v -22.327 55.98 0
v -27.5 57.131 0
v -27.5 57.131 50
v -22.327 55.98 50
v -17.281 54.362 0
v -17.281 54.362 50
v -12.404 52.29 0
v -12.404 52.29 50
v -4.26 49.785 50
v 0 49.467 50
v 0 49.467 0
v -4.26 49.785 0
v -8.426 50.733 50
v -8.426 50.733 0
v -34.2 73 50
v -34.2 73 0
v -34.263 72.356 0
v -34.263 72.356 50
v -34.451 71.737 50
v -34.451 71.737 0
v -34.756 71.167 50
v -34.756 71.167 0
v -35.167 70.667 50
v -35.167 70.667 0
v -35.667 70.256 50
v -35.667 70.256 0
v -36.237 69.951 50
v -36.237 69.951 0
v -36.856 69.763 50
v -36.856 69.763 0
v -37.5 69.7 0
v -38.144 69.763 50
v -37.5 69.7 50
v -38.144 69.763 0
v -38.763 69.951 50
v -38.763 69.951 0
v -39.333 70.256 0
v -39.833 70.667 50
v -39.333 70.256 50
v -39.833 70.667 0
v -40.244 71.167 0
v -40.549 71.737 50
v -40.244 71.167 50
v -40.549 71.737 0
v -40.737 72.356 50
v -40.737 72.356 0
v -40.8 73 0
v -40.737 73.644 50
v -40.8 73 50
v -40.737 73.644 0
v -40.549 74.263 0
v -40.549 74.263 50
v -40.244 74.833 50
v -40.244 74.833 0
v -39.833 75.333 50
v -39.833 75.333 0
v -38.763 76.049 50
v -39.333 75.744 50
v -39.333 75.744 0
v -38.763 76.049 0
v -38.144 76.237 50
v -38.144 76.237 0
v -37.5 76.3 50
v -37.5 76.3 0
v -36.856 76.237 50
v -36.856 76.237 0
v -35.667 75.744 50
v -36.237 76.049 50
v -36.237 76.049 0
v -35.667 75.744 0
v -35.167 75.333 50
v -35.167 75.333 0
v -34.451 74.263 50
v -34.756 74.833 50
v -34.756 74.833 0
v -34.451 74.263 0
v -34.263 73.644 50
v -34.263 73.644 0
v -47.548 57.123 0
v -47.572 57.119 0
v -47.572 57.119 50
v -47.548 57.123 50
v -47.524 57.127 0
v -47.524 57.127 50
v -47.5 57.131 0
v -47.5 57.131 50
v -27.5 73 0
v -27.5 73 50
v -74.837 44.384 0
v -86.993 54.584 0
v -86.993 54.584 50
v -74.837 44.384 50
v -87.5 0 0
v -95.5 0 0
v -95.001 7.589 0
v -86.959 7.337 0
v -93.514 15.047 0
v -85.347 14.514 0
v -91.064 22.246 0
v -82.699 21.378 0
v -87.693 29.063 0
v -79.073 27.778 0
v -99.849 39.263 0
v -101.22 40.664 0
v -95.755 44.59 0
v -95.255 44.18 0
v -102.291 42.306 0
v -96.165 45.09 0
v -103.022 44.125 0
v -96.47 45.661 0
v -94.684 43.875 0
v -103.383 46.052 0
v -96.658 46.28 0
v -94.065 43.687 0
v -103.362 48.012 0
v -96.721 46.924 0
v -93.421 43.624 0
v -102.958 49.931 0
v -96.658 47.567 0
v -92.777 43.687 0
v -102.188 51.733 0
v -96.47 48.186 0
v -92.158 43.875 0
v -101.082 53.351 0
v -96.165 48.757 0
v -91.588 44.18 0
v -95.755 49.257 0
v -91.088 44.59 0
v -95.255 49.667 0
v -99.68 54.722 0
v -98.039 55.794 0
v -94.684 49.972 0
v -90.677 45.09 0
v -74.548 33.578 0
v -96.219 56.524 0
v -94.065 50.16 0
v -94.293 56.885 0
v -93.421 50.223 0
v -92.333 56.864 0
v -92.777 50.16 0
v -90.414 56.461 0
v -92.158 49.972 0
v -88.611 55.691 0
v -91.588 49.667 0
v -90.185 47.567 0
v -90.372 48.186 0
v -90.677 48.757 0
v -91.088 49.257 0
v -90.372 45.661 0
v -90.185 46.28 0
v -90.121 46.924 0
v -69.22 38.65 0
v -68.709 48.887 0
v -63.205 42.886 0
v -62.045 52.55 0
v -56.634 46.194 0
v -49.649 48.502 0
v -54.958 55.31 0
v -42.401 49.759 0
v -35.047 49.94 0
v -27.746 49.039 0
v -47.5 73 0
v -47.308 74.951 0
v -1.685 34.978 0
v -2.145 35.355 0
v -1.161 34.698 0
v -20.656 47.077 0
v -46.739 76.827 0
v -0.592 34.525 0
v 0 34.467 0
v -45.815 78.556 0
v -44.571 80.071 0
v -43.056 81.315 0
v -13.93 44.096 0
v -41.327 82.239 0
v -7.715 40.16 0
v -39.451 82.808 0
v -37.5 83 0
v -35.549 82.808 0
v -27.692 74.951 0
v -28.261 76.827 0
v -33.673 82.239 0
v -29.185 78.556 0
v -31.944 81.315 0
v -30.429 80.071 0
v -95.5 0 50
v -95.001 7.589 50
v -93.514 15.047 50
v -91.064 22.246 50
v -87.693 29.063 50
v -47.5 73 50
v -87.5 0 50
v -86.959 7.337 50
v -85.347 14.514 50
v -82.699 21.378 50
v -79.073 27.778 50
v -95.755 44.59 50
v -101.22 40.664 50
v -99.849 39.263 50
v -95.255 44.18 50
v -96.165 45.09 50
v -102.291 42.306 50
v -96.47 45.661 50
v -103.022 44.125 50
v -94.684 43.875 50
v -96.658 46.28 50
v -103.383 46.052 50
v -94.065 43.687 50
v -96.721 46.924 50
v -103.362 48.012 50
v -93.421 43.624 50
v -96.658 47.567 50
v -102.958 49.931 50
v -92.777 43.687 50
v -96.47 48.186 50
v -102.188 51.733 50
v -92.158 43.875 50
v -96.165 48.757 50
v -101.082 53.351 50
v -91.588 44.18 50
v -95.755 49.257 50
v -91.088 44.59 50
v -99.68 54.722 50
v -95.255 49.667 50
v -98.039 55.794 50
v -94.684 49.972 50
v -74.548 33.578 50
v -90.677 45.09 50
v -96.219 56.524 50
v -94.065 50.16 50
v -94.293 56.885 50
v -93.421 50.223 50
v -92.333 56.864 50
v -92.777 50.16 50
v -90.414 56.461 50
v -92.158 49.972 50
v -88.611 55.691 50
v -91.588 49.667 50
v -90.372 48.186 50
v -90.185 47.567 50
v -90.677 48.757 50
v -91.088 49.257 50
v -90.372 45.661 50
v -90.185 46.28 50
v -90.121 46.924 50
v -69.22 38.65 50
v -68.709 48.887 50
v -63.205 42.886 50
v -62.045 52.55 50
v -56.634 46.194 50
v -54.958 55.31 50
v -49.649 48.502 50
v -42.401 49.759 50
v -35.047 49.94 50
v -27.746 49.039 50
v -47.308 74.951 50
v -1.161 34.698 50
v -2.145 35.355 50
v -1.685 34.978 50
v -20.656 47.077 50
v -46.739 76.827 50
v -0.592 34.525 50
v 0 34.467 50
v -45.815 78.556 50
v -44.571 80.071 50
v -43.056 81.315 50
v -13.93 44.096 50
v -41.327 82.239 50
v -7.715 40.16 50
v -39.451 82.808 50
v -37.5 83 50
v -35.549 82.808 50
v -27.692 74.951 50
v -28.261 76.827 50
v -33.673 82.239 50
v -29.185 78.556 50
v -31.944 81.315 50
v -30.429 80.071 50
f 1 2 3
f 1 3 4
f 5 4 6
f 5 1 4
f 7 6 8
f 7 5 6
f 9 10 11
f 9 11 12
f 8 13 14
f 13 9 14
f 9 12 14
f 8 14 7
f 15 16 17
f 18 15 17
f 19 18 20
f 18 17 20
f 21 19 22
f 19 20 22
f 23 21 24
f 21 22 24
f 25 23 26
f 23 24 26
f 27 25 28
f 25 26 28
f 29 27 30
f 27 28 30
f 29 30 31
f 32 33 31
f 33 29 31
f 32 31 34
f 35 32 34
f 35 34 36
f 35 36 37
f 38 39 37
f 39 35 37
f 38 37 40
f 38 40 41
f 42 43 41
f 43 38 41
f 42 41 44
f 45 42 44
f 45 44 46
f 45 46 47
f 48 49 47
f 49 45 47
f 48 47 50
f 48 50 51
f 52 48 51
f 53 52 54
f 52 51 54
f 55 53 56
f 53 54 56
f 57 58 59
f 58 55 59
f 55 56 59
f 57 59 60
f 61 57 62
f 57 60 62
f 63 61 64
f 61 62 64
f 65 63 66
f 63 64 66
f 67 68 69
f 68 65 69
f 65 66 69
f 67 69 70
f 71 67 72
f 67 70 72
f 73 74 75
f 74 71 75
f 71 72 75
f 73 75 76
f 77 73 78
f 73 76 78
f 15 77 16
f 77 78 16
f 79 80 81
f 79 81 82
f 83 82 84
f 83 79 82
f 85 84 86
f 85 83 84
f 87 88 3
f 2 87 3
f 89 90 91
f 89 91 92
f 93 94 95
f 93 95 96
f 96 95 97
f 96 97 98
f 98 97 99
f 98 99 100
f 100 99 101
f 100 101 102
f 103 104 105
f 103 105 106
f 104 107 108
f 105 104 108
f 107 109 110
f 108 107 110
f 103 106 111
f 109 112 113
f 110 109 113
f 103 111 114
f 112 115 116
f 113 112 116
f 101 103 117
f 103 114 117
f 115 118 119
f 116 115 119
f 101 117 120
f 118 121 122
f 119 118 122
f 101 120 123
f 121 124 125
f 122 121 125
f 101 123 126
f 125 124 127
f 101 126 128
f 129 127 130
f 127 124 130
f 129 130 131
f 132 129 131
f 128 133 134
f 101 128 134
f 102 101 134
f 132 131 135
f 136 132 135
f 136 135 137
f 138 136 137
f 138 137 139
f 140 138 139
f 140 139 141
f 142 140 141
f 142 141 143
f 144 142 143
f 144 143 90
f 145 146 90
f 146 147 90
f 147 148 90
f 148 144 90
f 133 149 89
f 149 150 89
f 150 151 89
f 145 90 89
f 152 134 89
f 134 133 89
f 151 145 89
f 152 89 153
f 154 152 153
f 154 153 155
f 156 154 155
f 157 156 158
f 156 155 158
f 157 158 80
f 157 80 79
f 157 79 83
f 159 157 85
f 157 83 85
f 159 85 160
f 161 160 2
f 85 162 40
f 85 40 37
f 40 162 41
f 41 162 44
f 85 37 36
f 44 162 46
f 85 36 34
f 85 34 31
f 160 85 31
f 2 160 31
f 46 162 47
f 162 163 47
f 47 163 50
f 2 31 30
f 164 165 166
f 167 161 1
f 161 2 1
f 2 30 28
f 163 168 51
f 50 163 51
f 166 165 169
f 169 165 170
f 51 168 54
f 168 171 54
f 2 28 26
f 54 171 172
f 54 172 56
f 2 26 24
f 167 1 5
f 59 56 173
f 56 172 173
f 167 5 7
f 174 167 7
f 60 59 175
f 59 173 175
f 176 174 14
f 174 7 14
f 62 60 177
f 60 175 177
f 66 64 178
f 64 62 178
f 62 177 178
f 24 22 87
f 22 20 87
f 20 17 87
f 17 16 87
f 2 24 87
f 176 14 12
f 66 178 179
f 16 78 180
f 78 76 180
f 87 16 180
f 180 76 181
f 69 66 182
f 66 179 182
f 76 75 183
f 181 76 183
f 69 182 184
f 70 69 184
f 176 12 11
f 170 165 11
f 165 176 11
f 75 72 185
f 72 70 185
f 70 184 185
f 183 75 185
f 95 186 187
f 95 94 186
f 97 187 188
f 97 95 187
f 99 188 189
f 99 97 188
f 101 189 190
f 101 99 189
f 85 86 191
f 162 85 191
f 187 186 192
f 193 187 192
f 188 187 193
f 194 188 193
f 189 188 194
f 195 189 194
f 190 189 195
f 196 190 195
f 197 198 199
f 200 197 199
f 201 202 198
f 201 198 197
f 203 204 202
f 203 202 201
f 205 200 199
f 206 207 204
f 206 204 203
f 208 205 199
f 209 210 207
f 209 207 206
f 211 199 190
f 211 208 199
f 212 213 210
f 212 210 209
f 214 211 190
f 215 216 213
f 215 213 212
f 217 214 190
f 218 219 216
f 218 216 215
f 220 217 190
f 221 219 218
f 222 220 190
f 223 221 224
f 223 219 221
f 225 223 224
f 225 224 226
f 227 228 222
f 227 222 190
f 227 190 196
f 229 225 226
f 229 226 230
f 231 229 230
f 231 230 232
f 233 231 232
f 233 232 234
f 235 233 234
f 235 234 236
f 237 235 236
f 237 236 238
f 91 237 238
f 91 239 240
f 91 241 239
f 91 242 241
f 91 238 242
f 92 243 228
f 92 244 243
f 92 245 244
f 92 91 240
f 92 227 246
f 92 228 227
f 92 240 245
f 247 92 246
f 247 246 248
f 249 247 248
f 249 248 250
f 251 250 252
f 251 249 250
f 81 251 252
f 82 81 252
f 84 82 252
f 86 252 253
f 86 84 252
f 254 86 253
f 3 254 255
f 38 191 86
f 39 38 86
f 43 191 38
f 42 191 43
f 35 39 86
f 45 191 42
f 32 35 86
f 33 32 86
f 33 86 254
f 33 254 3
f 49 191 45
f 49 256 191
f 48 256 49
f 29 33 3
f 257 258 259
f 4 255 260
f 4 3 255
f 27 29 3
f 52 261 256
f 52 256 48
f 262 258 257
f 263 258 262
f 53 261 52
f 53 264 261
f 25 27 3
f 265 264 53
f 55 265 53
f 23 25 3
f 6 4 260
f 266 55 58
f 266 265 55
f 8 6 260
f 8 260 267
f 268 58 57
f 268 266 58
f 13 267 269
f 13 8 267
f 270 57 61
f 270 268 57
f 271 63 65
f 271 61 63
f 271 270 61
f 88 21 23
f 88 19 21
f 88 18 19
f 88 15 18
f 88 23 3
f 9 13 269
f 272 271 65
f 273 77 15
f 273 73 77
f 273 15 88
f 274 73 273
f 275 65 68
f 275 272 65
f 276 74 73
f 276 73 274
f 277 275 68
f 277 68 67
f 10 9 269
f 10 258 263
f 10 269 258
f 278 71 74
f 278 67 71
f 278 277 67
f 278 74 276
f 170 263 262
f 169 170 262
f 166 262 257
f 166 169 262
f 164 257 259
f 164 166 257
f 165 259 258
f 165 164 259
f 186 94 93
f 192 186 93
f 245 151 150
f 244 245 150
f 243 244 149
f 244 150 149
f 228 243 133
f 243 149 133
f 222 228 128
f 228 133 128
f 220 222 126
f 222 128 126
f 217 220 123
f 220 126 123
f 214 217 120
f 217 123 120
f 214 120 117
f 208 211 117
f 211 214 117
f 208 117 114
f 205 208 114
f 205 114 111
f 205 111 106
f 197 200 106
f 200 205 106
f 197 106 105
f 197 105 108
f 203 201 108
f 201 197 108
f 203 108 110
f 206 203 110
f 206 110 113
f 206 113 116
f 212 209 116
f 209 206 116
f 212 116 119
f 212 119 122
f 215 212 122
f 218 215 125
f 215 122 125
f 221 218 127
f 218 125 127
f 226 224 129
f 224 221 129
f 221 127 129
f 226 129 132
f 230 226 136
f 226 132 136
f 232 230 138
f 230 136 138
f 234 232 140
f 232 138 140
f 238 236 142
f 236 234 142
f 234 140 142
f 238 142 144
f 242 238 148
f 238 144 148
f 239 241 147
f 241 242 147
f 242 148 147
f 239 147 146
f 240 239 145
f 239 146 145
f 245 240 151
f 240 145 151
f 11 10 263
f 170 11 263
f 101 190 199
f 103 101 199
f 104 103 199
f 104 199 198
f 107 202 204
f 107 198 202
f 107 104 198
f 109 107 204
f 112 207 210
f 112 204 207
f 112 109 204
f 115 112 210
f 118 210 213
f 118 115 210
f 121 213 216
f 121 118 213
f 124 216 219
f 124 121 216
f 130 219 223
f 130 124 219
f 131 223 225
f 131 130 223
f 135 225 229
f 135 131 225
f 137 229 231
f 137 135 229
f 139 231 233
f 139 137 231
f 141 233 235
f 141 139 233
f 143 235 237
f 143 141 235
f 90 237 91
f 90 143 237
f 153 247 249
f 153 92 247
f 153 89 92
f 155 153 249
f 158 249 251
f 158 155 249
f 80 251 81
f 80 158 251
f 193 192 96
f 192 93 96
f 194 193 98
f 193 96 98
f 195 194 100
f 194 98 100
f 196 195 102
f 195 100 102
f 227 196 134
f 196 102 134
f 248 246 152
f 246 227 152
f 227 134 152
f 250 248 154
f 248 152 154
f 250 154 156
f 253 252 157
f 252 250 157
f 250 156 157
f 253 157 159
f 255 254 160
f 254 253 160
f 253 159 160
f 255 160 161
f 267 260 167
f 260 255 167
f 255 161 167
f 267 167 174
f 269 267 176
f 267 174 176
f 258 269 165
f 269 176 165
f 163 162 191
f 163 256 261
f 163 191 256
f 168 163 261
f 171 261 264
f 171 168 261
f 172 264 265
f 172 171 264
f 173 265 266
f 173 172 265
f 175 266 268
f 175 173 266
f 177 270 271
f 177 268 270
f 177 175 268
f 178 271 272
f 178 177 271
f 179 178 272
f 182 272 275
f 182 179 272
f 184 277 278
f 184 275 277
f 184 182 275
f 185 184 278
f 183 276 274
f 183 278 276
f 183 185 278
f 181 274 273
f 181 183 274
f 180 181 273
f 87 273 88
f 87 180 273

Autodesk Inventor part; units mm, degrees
ref_plane "YZ Plane" through (0, 0, 0) normal (1, 0, 0) x (0, 1, 0)
ref_plane "XZ Plane" through (0, 0, 0) normal (0, 1, 0) x (-1, 0, 0)
ref_plane "XY Plane" through (0, 0, 0) normal (0, 0, 1) x (1, 0, 0)
sketch "Sketch1" plane through (0, 0, 0) normal (0, 0, 1) x (1, 0, 0)
  line L0 (-110.5, 0) -> (110.5, 0) construction
  line L1 (0, 110.5) -> (0, -110.5) construction
  line L2 (-110.5, 110.5) -> (110.5, 110.5) construction
  line L3 (110.5, 110.5) -> (110.5, -110.5) construction
  line L4 (110.5, -110.5) -> (-110.5, -110.5) construction
  line L5 (-110.5, -110.5) -> (-110.5, 110.5) construction
  circle A0 centre (-37.5, 0) radius 37.5 construction
  circle A1 centre (37.5, 0) radius 37.5 construction
  arc A2 (-2.1447, 35.3553) -> (-87.5, 0) centre (-37.5, 0) ccw
  arc A3 (-2.1447, 35.3553) -> (0, 34.467) centre (0, 37.5) ccw
  line L6 (-37.5, 0) -> (-2.1447, 35.3553) construction
  arc A4 (-47.5716, 57.1188) -> (-74.8373, 44.3838) centre (-37.5, 0) ccw
  arc A5 (-12.404, 52.2895) -> (-27.5, 57.1314) centre (-37.5, 0) ccw
  arc A6 (-12.404, 52.2895) -> (0, 49.467) centre (0, 78.1341) ccw
  line L7 (-37.5, 0) -> (-110.5, 61.2543) construction
  line L8 (-37.5, 0) -> (20.5, 0) construction
  line L9 (-37.5, 0) -> (-37.5, 110.5) construction
  line L10 (-87.6931, 29.0629) -> (-99.8491, 39.2631)
  arc A7 (-86.9934, 54.5839) -> (-99.8491, 39.2631) centre (-93.4212, 46.9235) ccw
  line L11 (-86.9934, 54.5839) -> (-74.8373, 44.3838)
  circle A8 centre (-93.4212, 46.9235) radius 3.3
  line L12 (-97.844, 50.6346) -> (-92.4187, 52.6093) construction
  line L13 (-92.4187, 52.6093) -> (-87.9959, 48.8981) construction
  line L14 (-87.9959, 48.8981) -> (-88.9985, 43.2124) construction
  line L15 (-88.9985, 43.2124) -> (-94.4238, 41.2377) construction
  line L16 (-94.4238, 41.2377) -> (-98.8466, 44.9488) construction
  line L17 (-98.8466, 44.9488) -> (-97.844, 50.6346) construction
  line L18 (-47.5, 57.1314) -> (-47.5, 73)
  line L19 (-27.5, 73) -> (-27.5, 57.1314)
  line L20 (-32.5, 70.1132) -> (-37.5, 67.2265) construction
  line L21 (-37.5, 78.7735) -> (-32.5, 75.8868) construction
  line L22 (-37.5, 67.2265) -> (-42.5, 70.1132) construction
  line L23 (-42.5, 75.8868) -> (-37.5, 78.7735) construction
  arc A9 (-27.5, 73) -> (-47.5, 73) centre (-37.5, 73) ccw
  line L24 (-32.5, 75.8868) -> (-32.5, 70.1132) construction
  circle A10 centre (-37.5, 73) radius 3.3
  line L25 (-42.5, 70.1132) -> (-42.5, 75.8868) construction
  line L26 (-37.5, 0) -> (-2.1447, -35.3553) construction
  line L27 (0, 49.467) -> (0, 34.467)
  arc A11 (-27.5, 57.1314) -> (-47.5, 57.1314) centre (-37.5, 0) ccw construction
  arc A12 (-47.5, 57.1314) -> (-47.5716, 57.1188) centre (-37.5, 0) ccw
  arc A13 (-74.8373, 44.3838) -> (-87.6931, 29.0629) centre (-37.5, 0) ccw construction
  arc A14 (-87.6931, 29.0629) -> (-95.5, 0) centre (-37.5, 0) ccw
  line L28 (-95.5, 0) -> (-87.5, 0)
  point P0 (0, 0)
  point P1 (0, 0)
  point P2 (0, 0)
  point P3 (-81.9306, 37.2817)
  point P4 (-37.5, 58)
  dimension "d10" = 75
  dimension "d7" = 221
  dimension "d8" = 221
  dimension "d9" = 75
  dimension "d11" = 50
  dimension "d12" = 135
  dimension "d13" = 8
  dimension "d14" = 15
  dimension "d15" = 140
  dimension "d17" = 10
  dimension "d19" = 6.6
  dimension "d20" = 15
  dimension "d21" = 10
  dimension "d24" = 50
extrude "Extrusion1" add sketch "Sketch1" along normal blind 50
sketch "Sketch4" plane through (0, 0, 50) normal (0, 0, 1) x (1, 0, 0)
  line L0 (0, 0) -> (0, 122) construction
  line L1 (0, 0) -> (-181, 0) construction
  arc A0 (-87.6931, 29.0629) -> (-95.5, 0) centre (-37.5, 0) ccw construction
  arc A1 (-12.404, 52.2895) -> (-95.5, 0) centre (-37.5, 0) ccw
  arc A2 (-12.404, 52.2895) -> (0, 49.467) centre (0, 78.1341) ccw projected
  line L2 (0, 49.467) -> (0, 0)
  arc A3 (-87.6931, 29.0629) -> (-95.5, 0) centre (-37.5, 0) ccw projected
sketch "Sketch5" plane through (0, 34.467, 0) normal (1, 0, 0) x (0, 0, -1)
  arc A0 (-50, 23.533) -> (-66, -34.467) centre (47.125, -34.467) ccw
  line L0 (-50, -34.467) -> (-50, 15.533) construction
  line L1 (-50, -34.467) -> (-94, -34.467) construction
  line L2 (0, -34.467) -> (-50, -34.467) construction
  line L3 (-50, 22.6644) -> (-50, 38.533) projected
  dimension "d28" = 116
  dimension "d29" = 16
equation "\"d10\" = d9"
properties part number "Gehäuse"
